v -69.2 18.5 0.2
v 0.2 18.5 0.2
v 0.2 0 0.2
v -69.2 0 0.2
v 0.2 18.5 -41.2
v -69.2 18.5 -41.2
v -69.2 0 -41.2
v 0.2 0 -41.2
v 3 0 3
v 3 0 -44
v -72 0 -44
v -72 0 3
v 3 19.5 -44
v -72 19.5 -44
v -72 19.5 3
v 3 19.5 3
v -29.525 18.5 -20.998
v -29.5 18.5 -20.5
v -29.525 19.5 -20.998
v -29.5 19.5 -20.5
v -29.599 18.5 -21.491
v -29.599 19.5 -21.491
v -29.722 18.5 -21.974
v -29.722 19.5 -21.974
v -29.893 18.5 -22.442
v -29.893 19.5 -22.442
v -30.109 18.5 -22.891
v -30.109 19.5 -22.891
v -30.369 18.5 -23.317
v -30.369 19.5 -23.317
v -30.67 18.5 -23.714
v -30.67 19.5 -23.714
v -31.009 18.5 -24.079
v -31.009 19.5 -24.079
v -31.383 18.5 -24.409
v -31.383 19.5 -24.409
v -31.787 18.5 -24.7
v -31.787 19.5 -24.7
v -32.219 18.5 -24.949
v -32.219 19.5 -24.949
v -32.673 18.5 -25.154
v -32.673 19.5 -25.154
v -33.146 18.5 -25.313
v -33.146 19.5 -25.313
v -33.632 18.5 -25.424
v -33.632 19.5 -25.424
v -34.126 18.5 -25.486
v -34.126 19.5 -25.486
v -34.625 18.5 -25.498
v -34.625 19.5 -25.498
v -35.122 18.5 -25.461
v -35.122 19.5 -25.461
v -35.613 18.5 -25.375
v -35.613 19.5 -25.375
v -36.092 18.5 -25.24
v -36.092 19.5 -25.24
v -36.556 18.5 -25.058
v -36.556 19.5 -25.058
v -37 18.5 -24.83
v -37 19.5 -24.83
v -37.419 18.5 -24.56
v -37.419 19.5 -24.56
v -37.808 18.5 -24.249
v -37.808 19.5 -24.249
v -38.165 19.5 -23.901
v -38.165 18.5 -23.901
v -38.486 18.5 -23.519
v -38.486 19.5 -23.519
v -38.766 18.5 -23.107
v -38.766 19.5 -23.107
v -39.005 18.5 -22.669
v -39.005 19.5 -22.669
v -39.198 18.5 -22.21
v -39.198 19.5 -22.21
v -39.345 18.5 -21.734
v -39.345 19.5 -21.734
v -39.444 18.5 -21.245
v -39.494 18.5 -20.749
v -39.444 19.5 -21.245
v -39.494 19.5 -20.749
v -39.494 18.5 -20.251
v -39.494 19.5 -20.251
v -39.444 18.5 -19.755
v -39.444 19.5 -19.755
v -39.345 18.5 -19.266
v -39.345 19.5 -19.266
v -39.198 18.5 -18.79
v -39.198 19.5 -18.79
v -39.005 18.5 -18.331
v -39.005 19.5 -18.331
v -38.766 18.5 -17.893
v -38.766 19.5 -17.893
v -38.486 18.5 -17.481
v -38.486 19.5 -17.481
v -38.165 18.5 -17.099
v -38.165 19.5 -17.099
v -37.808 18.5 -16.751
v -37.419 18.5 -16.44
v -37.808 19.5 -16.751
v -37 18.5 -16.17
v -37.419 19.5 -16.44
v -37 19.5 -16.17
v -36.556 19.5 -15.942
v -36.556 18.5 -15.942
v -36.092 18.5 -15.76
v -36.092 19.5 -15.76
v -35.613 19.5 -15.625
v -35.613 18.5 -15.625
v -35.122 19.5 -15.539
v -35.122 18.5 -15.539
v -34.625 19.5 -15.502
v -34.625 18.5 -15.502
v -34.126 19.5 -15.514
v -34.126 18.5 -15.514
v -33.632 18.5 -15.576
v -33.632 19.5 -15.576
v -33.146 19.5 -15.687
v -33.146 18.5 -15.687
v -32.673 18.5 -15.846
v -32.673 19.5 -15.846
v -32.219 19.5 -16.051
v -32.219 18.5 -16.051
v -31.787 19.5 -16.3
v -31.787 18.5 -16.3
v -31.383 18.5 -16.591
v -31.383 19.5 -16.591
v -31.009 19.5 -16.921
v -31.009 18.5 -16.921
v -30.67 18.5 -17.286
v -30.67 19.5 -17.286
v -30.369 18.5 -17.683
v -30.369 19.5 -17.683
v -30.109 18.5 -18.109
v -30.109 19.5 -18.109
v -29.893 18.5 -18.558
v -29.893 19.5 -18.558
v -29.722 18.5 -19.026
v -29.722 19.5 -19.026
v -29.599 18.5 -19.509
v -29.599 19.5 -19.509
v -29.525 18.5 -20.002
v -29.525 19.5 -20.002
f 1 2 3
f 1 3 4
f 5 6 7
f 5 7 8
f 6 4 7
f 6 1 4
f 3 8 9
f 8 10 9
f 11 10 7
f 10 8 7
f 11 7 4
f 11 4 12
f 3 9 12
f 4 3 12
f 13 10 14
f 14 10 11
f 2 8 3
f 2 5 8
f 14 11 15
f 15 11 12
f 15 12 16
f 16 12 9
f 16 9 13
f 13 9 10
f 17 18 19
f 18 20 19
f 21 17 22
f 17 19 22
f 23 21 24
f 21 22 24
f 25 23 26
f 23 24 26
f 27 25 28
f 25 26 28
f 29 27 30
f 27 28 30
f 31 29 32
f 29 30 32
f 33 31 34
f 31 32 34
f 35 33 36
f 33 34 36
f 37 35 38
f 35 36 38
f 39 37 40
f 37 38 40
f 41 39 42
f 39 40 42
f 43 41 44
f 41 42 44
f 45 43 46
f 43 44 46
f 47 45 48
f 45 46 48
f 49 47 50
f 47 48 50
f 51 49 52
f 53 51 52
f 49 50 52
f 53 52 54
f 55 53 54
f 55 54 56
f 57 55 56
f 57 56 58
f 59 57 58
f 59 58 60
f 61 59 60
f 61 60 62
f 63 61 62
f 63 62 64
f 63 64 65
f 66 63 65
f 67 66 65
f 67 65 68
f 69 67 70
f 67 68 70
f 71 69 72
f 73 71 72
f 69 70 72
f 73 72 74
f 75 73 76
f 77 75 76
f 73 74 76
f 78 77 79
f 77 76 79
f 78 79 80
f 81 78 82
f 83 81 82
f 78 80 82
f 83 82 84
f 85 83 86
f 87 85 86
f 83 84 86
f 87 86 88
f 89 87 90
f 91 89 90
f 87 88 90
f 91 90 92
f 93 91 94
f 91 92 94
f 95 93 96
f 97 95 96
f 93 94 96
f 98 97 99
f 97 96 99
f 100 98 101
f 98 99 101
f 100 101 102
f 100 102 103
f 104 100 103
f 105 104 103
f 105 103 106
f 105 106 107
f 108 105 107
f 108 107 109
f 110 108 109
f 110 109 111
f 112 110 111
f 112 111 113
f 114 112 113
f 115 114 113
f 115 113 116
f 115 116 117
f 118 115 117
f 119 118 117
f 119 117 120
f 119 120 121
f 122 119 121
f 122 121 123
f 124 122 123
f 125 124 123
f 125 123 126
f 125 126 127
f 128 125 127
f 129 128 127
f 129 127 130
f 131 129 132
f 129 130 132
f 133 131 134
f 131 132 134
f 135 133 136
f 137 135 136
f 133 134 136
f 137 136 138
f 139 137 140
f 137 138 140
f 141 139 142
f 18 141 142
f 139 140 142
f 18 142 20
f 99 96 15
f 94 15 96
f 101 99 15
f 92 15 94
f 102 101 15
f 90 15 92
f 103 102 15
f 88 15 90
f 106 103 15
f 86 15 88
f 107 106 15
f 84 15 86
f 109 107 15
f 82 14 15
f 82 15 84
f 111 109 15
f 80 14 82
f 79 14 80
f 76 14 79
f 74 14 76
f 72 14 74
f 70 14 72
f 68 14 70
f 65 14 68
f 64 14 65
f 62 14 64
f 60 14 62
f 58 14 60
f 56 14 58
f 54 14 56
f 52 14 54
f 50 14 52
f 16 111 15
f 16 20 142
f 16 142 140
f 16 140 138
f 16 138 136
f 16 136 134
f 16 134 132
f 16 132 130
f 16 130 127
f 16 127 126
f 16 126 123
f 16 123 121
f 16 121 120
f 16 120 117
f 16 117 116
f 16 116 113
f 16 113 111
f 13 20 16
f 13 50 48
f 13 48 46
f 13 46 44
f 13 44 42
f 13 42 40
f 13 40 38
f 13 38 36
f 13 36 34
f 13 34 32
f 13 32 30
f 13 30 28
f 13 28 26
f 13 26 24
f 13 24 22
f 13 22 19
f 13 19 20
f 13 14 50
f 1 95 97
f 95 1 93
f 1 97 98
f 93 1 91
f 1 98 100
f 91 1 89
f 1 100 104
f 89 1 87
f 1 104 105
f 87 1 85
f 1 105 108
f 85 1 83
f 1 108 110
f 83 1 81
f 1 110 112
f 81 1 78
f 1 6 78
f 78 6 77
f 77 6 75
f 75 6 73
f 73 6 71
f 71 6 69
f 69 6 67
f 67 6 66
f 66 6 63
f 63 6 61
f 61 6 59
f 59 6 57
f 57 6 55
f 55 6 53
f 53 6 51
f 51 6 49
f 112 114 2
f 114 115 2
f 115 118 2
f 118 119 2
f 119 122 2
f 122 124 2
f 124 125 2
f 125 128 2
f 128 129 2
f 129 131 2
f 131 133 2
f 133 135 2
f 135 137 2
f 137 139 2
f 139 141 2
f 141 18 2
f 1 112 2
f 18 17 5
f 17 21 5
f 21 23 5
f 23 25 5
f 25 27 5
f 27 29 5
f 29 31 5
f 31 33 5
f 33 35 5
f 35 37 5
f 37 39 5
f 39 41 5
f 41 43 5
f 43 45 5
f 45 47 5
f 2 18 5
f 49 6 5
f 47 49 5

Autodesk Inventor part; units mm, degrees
ref_plane "YZ Plane" through (0, 0, 0) normal (1, 0, 0) x (0, 1, 0)
ref_plane "XZ Plane" through (0, 0, 0) normal (0, 1, 0) x (-1, 0, 0)
ref_plane "XY Plane" through (0, 0, 0) normal (0, 0, 1) x (1, 0, 0)
sketch "Sketch1" plane through (0, 0, 0) normal (0, 1, 0) x (-1, 0, 0)
  line L0 (0, 0) -> (69, 0)
  line L1 (69, 0) -> (69, -41)
  line L2 (69, -41) -> (0, -41)
  line L3 (0, -41) -> (0, 0)
  line L4 (-3, 3) -> (72, 3)
  line L5 (72, 3) -> (72, -44)
  line L6 (72, -44) -> (-3, -44)
  line L7 (-3, -44) -> (-3, 3)
  dimension "d0" = 69
  dimension "d1" = 41
  dimension "d2" = 3
extrude "Extrusion1" add sketch "Sketch1" along normal blind 18.5
sketch "Sketch2" plane through (0, 18.5, 0) normal (0, 1, 0) x (1, 0, 0)
  line L0 (0, 0) -> (-69, 0) projected
  line L1 (-69, 41) -> (0, 41) projected
  line L2 (-69, 0) -> (0, 0)
  line L3 (0, 0) -> (0, 41)
  line L4 (0, 41) -> (-69, 41)
  line L5 (-69, 41) -> (-69, 0)
  line L6 (0.2, 41.2) -> (0.2, -0.2)
  line L7 (0.2, -0.2) -> (-69.2, -0.2)
  line L8 (-69.2, -0.2) -> (-69.2, 41.2)
  line L9 (-69.2, 41.2) -> (0.2, 41.2)
  dimension "d5" = 0.2
extrude "Extrusion2" cut sketch "Sketch2" against normal blind 18.5
sketch "Sketch3" plane through (0, 18.5, 0) normal (0, 1, 0) x (1, 0, 0)
  line L0 (-72, -3) -> (3, -3) projected
  line L1 (3, -3) -> (3, 44) projected
  line L2 (-72, -3) -> (3, -3)
  line L3 (3, -3) -> (3, 44)
  line L4 (3, 44) -> (-72, 44)
  line L5 (-72, 44) -> (-72, -3)
  point P0 (0, 0)
extrude "Extrusion3" add sketch "Sketch3" along normal blind 1
sketch "Sketch4" plane through (0, 19.5, 0) normal (0, 1, 0) x (1, 0, 0)
  line L0 (3, -3) -> (3, 44) projected
  line L1 (3, 44) -> (-72, 44) projected
  line L2 (3, -3) -> (-72, 44)
  circle A0 centre (-34.5, 20.5) radius 5
  point P0 (0, 0)
  dimension "d10" = 10
extrude "Extrusion4" cut sketch "Sketch4" against normal blind 1 contours A0 L2 | L2 A0
properties part number "top batt cage"
